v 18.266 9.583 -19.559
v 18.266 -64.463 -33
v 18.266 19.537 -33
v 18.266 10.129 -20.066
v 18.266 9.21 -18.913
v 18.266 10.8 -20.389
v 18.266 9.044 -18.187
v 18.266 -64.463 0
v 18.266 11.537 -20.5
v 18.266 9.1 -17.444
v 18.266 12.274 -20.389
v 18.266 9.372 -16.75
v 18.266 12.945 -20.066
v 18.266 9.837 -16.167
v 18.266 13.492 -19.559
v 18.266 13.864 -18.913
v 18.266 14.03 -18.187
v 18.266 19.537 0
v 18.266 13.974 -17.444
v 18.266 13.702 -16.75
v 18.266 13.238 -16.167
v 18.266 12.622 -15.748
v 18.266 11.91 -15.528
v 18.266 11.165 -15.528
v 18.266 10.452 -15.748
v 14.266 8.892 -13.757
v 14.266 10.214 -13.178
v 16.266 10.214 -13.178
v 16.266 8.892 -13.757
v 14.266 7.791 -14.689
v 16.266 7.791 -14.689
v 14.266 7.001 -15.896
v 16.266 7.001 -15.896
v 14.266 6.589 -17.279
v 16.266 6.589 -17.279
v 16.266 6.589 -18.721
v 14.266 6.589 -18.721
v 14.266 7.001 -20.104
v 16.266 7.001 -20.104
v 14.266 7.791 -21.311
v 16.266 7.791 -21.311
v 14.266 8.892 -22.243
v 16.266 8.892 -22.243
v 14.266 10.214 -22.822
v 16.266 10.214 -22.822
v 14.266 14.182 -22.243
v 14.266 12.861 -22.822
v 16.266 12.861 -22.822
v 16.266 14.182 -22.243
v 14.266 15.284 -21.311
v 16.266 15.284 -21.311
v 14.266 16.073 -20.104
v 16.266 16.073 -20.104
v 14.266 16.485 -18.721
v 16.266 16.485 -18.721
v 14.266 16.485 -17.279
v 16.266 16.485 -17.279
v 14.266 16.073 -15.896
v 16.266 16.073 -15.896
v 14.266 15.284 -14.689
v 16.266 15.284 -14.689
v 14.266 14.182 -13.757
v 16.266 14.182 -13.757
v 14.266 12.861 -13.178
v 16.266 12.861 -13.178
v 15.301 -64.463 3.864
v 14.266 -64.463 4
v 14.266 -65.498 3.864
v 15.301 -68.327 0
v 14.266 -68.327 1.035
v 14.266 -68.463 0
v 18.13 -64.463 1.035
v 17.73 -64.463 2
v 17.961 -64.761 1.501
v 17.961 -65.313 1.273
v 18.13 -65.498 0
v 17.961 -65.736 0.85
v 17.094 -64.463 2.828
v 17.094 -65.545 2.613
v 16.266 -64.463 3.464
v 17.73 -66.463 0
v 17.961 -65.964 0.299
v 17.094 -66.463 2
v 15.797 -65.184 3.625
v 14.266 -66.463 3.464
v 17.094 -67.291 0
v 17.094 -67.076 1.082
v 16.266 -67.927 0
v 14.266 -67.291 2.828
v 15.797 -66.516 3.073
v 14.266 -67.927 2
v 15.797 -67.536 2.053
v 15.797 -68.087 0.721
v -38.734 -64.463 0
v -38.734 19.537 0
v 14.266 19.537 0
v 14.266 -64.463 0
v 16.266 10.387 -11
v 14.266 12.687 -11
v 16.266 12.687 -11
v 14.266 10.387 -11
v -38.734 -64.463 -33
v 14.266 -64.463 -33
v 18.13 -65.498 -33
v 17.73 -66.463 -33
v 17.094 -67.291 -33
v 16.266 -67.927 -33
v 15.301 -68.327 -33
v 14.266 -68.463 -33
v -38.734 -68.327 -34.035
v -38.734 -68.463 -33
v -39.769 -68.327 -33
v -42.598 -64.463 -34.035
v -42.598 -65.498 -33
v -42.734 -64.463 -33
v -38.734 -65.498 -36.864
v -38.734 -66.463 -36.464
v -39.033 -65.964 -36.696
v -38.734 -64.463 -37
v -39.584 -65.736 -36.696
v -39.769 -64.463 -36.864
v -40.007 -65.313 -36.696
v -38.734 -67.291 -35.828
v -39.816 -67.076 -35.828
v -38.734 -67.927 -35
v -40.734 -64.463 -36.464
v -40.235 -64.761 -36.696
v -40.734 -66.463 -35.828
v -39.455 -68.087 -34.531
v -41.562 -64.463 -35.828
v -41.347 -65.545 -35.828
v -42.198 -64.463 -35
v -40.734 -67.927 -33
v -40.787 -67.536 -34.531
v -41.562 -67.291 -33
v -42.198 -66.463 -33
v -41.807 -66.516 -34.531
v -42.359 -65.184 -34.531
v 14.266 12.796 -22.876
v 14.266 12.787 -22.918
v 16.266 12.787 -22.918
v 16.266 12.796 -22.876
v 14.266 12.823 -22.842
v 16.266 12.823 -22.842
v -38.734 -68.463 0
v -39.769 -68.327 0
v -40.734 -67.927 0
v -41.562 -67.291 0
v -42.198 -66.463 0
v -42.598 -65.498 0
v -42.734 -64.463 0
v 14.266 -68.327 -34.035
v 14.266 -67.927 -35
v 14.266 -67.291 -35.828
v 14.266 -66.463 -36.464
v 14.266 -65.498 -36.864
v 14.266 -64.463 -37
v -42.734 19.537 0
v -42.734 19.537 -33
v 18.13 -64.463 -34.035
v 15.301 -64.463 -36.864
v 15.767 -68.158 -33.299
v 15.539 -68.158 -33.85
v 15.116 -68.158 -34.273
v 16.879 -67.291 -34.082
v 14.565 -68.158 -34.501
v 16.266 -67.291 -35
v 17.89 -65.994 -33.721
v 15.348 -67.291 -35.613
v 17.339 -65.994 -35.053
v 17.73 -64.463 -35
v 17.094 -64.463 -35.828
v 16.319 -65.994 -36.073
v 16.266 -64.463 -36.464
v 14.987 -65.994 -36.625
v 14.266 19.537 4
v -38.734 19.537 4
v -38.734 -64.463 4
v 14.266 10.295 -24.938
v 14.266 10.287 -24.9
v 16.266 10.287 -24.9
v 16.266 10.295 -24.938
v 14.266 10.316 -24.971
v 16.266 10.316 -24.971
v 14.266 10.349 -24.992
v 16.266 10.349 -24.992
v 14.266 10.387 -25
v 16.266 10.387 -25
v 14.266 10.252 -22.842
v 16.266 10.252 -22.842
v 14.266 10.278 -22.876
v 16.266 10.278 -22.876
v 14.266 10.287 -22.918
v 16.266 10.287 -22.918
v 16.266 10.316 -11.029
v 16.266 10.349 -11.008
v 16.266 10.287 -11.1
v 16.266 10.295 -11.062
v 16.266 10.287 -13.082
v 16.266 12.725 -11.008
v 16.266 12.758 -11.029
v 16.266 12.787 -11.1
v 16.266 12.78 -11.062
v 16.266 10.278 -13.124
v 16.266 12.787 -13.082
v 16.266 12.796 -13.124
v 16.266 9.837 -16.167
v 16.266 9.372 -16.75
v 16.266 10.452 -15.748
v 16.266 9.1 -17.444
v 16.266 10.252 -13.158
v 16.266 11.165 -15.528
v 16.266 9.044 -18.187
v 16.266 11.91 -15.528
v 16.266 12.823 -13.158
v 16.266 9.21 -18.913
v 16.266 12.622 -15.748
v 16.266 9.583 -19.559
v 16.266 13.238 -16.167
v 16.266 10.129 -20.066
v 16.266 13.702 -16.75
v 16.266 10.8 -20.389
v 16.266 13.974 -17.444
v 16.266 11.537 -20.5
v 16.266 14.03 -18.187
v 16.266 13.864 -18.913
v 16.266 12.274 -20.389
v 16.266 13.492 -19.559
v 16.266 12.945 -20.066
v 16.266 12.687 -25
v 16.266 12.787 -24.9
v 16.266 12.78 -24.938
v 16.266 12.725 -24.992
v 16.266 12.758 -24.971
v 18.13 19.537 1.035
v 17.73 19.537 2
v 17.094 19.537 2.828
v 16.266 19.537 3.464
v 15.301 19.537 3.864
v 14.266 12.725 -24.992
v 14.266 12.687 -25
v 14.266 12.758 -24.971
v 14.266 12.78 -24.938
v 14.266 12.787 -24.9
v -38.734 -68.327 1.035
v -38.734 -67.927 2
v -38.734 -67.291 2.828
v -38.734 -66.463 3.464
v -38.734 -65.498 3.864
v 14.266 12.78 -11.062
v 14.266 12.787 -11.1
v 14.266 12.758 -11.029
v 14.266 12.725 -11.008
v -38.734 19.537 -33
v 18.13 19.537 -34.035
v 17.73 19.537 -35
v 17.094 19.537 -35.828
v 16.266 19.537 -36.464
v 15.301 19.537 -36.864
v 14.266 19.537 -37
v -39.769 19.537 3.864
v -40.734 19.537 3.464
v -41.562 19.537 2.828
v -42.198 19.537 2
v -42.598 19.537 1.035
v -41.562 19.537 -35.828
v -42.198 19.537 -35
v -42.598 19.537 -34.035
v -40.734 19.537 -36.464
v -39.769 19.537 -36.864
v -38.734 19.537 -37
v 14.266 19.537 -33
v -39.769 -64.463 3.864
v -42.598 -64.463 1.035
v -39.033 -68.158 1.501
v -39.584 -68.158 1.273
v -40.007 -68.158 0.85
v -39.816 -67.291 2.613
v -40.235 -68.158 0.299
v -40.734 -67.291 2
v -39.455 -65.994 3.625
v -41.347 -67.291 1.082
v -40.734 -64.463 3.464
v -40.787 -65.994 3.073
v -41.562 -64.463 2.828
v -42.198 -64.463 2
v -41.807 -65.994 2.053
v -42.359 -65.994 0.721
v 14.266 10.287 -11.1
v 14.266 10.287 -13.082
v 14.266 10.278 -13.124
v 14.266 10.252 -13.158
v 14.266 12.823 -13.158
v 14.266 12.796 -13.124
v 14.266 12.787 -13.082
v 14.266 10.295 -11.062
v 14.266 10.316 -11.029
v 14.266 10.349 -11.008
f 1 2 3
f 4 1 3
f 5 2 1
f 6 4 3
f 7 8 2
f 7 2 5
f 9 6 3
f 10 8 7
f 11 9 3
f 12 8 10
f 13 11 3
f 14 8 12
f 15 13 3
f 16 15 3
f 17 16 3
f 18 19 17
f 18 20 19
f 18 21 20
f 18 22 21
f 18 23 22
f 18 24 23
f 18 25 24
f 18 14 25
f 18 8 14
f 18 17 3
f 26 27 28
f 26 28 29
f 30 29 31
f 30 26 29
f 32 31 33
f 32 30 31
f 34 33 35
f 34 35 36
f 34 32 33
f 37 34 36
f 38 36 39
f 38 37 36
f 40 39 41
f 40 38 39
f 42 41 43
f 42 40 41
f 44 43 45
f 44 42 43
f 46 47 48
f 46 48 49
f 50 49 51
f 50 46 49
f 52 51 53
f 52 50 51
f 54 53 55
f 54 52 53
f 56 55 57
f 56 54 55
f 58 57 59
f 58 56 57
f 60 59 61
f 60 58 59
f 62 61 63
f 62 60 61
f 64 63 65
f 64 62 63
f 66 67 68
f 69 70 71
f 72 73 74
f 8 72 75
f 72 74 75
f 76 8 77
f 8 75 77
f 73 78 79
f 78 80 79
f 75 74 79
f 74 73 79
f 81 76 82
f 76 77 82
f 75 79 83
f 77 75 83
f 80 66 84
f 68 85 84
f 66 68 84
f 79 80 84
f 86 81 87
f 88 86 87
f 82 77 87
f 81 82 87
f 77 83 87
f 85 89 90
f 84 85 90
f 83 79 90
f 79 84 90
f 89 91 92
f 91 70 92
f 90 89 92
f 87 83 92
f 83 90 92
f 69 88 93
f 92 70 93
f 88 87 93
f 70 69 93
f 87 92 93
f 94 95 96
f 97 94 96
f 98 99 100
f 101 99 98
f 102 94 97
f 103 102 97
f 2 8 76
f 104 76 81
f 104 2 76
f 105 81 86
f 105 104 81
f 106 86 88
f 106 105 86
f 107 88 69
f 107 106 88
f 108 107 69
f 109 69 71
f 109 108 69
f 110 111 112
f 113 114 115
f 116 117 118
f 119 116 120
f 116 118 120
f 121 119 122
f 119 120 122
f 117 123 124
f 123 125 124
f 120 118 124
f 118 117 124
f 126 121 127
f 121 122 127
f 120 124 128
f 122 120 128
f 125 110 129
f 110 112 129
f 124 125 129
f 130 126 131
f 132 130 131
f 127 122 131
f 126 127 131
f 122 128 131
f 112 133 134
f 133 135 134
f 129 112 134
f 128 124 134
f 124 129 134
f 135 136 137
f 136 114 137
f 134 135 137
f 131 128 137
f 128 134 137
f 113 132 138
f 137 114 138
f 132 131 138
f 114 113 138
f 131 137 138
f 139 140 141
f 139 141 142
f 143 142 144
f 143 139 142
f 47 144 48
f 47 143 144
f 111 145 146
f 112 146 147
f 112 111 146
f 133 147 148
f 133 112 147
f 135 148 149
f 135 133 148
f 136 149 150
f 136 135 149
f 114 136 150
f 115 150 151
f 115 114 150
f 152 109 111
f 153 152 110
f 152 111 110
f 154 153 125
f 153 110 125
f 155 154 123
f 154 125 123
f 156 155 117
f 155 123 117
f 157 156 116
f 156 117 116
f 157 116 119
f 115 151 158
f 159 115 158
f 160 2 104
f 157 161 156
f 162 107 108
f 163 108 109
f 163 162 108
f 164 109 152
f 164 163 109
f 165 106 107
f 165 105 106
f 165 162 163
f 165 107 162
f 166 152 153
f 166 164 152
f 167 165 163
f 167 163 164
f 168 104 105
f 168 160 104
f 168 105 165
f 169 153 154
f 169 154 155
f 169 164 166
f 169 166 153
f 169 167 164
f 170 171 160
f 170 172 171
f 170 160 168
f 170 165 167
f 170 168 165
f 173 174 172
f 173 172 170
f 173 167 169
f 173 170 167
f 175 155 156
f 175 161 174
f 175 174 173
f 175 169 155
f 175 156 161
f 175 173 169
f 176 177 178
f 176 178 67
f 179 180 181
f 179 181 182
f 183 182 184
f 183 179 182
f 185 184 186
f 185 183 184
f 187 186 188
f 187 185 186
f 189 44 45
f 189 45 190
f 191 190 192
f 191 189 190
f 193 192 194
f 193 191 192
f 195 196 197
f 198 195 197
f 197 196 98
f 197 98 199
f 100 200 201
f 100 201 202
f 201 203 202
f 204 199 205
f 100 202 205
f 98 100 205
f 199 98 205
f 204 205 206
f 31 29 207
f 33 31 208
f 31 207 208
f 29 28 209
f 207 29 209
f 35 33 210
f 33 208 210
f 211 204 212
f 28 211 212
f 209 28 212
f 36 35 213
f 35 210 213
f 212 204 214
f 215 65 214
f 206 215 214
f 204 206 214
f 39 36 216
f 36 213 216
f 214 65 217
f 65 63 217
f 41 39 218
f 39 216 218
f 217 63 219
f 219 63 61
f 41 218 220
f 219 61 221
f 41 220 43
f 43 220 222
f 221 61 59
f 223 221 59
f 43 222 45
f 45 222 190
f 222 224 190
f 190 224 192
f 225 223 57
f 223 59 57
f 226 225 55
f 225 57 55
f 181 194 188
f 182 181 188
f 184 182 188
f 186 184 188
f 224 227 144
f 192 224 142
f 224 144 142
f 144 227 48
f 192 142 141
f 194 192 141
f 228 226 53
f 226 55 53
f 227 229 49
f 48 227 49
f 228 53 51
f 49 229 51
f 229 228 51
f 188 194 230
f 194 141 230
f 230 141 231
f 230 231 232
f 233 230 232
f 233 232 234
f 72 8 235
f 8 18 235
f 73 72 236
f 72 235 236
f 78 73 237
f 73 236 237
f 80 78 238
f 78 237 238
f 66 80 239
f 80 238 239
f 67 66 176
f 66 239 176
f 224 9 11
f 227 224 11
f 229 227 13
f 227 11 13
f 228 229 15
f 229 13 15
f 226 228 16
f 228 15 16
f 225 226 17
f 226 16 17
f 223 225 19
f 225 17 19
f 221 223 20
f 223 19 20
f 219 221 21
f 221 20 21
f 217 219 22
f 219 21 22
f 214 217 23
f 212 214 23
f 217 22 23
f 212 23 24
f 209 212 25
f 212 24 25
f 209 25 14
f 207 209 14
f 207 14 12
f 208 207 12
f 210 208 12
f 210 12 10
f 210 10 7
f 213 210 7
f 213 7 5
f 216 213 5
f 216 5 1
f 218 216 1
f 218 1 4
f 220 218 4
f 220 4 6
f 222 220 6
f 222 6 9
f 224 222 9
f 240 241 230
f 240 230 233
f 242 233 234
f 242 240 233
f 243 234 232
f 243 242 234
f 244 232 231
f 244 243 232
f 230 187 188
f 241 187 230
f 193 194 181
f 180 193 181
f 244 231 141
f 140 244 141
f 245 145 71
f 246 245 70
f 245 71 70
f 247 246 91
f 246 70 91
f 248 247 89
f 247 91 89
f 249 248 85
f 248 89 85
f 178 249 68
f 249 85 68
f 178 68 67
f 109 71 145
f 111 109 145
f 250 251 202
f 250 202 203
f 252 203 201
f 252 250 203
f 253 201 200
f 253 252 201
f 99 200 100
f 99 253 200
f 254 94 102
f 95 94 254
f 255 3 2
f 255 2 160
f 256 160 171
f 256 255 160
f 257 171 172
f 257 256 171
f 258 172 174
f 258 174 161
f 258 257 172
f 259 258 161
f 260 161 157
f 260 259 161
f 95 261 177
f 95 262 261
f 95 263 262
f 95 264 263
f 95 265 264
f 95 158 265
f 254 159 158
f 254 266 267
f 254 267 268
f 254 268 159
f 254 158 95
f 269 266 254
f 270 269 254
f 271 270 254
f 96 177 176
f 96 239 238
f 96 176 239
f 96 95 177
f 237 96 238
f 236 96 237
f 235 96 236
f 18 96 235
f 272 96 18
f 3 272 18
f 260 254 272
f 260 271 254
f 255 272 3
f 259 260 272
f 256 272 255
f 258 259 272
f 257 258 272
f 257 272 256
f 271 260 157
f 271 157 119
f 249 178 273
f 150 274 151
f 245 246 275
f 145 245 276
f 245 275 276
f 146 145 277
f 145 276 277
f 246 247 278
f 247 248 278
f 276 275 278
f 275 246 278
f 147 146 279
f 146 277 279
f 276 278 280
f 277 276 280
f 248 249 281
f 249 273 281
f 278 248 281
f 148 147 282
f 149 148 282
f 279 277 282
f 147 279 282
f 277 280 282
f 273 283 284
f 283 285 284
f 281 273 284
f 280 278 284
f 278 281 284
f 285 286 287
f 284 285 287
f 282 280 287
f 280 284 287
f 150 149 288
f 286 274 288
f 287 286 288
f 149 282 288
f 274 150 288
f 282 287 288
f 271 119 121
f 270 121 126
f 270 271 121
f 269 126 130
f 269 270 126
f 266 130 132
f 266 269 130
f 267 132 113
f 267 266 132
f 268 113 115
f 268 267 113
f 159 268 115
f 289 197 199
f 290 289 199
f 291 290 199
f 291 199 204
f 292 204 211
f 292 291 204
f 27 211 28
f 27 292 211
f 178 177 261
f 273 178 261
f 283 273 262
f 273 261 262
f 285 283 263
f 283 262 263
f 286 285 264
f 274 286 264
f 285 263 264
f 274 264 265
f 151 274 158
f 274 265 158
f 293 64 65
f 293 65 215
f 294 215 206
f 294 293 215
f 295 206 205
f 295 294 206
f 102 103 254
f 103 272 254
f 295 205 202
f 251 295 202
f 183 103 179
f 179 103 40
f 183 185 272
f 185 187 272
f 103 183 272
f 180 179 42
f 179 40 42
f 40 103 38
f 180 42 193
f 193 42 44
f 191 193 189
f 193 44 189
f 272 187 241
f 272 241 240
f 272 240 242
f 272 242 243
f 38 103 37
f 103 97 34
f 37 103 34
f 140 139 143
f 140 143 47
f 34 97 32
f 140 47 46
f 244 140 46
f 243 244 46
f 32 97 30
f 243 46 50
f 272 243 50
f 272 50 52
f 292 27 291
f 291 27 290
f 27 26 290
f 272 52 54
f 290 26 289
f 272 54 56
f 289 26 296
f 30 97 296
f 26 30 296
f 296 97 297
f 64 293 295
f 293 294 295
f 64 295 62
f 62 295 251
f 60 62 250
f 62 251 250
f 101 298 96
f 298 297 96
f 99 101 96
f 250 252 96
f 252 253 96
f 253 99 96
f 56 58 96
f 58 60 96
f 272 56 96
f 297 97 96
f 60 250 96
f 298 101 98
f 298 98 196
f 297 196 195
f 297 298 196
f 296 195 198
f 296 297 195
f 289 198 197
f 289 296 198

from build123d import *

# Parameters (mm, degrees)
ESBO_O1_W                = 61
ESBO_O1_H                = 92
ESBO_O1_W_2              = 53
ESBO_O1_H_2              = 84
RESSALTO_EXTRUS_O2_DEPTH = 33
ESBO_O5_W                = 61
ESBO_O5_H                = 92
RESSALTO_EXTRUS_O4_DEPTH = 4
ESBO_O6_R                = 2.5
CORTE_EXTRUS_O4_DEPTH    = 4
CORTE_EXTRUS_O5_DEPTH    = 2
ESBO_O8_W                = 61
ESBO_O8_H                = 92
RESSALTO_EXTRUS_O5_DEPTH = 4
ESBO_O9_W                = 61
ESBO_O9_H                = 41
CORTE_EXTRUS_O6_DEPTH    = 4
FILETE1_R                = 4


with BuildPart() as part:
    # Esboço1 → Ressalto-extrusão2 (new body)
    with BuildSketch(Plane.XY):
        with Locations((-12.234044221, -22.462857143)):
            Rectangle(ESBO_O1_W, ESBO_O1_H)
        with Locations((-12.234044221, -22.462857143)):
            Rectangle(ESBO_O1_W_2, ESBO_O1_H_2, mode=Mode.SUBTRACT)
    extrude(amount=-RESSALTO_EXTRUS_O2_DEPTH)

    # Esboço5 → Ressalto-extrusão4 (add)
    with BuildSketch(Plane.XY):
        with Locations((-12.234044221, -22.462857143)):
            Rectangle(ESBO_O5_W, ESBO_O5_H)
    extrude(amount=RESSALTO_EXTRUS_O4_DEPTH)

    # Esboço6 → Corte-extrusão4 (cut)
    with BuildSketch(Plane(origin=(18.265955779, 0, 0), x_dir=(0, 0, -1), z_dir=(1, 0, 0))):
        with Locations((18, 11.537142857)):
            Circle(ESBO_O6_R)
    extrude(amount=-CORTE_EXTRUS_O4_DEPTH, mode=Mode.SUBTRACT)

    # Esboço7 → Corte-extrusão5 (cut)
    with BuildSketch(Plane.ZY.offset(-14.265955779)):
        with BuildLine():
            Line((-11.1, 10.287142857), (-13.081921107, 10.287142857))
            ThreePointArc((-13.081921107, 10.287142857), (-13.142555013, 10.26666348), (-13.178354026, 10.213613445))
            ThreePointArc((-13.178354026, 10.213613445), (-18, 6.537142857), (-22.821645974, 10.213613445))
            ThreePointArc((-22.821645974, 10.213613445), (-22.857444987, 10.26666348), (-22.918078893, 10.287142857))
            Line((-22.918078893, 10.287142857), (-24.9, 10.287142857))
            ThreePointArc((-24.9, 10.287142857), (-24.970710678, 10.316432179), (-25, 10.387142857))
            Line((-25, 10.387142857), (-25, 12.687142857))
            ThreePointArc((-25, 12.687142857), (-24.970710678, 12.757853535), (-24.9, 12.787142857))
            Line((-24.9, 12.787142857), (-22.918078893, 12.787142857))
            ThreePointArc((-22.918078893, 12.787142857), (-22.857444987, 12.807622235), (-22.821645974, 12.860672269))
            ThreePointArc((-22.821645974, 12.860672269), (-18, 16.537142857), (-13.178354026, 12.860672269))
            ThreePointArc((-13.178354026, 12.860672269), (-13.142555013, 12.807622235), (-13.081921107, 12.787142857))
            Line((-13.081921107, 12.787142857), (-11.1, 12.787142857))
            ThreePointArc((-11.1, 12.787142857), (-11.029289322, 12.757853535), (-11, 12.687142857))
            Line((-11, 12.687142857), (-11, 10.387142857))
            ThreePointArc((-11, 10.387142857), (-11.029289322, 10.316432179), (-11.1, 10.287142857))
        make_face()
    extrude(amount=-CORTE_EXTRUS_O5_DEPTH, mode=Mode.SUBTRACT)

    # Esboço8 → Ressalto-extrusão5 (add)
    with BuildSketch(Plane(origin=(0, 0, -33), x_dir=(-1, 0, 0), z_dir=(0, 0, -1))):
        with Locations((12.234044221, -22.462857143)):
            Rectangle(ESBO_O8_W, ESBO_O8_H)
    extrude(amount=RESSALTO_EXTRUS_O5_DEPTH)

    # Esboço9 → Corte-extrusão6 (cut)
    with BuildSketch(Plane(origin=(0, 23.537142857, 0), x_dir=(1, 0, 0), z_dir=(0, 1, 0))):
        with Locations((-12.234044221, 16.5)):
            Rectangle(ESBO_O9_W, ESBO_O9_H)
    extrude(amount=-CORTE_EXTRUS_O6_DEPTH, mode=Mode.SUBTRACT)

    # Filete1
    filete1_edges = [part.edges().sort_by_distance(p)[0] for p in [
        (18.265955779, -24.462857143, -37),
        (-42.734044221, -24.462857143, 4),
        (-12.234044221, -68.462857143, 4),
        (18.265955779, -24.462857143, 4),
        (18.265955779, -68.462857143, -16.5),
        (-42.734044221, -68.462857143, -16.5),
        (-12.234044221, -68.462857143, -37),
        (-42.734044221, -24.462857143, -37),
    ]]
    fillet(filete1_edges, radius=FILETE1_R)


solid = part.part
